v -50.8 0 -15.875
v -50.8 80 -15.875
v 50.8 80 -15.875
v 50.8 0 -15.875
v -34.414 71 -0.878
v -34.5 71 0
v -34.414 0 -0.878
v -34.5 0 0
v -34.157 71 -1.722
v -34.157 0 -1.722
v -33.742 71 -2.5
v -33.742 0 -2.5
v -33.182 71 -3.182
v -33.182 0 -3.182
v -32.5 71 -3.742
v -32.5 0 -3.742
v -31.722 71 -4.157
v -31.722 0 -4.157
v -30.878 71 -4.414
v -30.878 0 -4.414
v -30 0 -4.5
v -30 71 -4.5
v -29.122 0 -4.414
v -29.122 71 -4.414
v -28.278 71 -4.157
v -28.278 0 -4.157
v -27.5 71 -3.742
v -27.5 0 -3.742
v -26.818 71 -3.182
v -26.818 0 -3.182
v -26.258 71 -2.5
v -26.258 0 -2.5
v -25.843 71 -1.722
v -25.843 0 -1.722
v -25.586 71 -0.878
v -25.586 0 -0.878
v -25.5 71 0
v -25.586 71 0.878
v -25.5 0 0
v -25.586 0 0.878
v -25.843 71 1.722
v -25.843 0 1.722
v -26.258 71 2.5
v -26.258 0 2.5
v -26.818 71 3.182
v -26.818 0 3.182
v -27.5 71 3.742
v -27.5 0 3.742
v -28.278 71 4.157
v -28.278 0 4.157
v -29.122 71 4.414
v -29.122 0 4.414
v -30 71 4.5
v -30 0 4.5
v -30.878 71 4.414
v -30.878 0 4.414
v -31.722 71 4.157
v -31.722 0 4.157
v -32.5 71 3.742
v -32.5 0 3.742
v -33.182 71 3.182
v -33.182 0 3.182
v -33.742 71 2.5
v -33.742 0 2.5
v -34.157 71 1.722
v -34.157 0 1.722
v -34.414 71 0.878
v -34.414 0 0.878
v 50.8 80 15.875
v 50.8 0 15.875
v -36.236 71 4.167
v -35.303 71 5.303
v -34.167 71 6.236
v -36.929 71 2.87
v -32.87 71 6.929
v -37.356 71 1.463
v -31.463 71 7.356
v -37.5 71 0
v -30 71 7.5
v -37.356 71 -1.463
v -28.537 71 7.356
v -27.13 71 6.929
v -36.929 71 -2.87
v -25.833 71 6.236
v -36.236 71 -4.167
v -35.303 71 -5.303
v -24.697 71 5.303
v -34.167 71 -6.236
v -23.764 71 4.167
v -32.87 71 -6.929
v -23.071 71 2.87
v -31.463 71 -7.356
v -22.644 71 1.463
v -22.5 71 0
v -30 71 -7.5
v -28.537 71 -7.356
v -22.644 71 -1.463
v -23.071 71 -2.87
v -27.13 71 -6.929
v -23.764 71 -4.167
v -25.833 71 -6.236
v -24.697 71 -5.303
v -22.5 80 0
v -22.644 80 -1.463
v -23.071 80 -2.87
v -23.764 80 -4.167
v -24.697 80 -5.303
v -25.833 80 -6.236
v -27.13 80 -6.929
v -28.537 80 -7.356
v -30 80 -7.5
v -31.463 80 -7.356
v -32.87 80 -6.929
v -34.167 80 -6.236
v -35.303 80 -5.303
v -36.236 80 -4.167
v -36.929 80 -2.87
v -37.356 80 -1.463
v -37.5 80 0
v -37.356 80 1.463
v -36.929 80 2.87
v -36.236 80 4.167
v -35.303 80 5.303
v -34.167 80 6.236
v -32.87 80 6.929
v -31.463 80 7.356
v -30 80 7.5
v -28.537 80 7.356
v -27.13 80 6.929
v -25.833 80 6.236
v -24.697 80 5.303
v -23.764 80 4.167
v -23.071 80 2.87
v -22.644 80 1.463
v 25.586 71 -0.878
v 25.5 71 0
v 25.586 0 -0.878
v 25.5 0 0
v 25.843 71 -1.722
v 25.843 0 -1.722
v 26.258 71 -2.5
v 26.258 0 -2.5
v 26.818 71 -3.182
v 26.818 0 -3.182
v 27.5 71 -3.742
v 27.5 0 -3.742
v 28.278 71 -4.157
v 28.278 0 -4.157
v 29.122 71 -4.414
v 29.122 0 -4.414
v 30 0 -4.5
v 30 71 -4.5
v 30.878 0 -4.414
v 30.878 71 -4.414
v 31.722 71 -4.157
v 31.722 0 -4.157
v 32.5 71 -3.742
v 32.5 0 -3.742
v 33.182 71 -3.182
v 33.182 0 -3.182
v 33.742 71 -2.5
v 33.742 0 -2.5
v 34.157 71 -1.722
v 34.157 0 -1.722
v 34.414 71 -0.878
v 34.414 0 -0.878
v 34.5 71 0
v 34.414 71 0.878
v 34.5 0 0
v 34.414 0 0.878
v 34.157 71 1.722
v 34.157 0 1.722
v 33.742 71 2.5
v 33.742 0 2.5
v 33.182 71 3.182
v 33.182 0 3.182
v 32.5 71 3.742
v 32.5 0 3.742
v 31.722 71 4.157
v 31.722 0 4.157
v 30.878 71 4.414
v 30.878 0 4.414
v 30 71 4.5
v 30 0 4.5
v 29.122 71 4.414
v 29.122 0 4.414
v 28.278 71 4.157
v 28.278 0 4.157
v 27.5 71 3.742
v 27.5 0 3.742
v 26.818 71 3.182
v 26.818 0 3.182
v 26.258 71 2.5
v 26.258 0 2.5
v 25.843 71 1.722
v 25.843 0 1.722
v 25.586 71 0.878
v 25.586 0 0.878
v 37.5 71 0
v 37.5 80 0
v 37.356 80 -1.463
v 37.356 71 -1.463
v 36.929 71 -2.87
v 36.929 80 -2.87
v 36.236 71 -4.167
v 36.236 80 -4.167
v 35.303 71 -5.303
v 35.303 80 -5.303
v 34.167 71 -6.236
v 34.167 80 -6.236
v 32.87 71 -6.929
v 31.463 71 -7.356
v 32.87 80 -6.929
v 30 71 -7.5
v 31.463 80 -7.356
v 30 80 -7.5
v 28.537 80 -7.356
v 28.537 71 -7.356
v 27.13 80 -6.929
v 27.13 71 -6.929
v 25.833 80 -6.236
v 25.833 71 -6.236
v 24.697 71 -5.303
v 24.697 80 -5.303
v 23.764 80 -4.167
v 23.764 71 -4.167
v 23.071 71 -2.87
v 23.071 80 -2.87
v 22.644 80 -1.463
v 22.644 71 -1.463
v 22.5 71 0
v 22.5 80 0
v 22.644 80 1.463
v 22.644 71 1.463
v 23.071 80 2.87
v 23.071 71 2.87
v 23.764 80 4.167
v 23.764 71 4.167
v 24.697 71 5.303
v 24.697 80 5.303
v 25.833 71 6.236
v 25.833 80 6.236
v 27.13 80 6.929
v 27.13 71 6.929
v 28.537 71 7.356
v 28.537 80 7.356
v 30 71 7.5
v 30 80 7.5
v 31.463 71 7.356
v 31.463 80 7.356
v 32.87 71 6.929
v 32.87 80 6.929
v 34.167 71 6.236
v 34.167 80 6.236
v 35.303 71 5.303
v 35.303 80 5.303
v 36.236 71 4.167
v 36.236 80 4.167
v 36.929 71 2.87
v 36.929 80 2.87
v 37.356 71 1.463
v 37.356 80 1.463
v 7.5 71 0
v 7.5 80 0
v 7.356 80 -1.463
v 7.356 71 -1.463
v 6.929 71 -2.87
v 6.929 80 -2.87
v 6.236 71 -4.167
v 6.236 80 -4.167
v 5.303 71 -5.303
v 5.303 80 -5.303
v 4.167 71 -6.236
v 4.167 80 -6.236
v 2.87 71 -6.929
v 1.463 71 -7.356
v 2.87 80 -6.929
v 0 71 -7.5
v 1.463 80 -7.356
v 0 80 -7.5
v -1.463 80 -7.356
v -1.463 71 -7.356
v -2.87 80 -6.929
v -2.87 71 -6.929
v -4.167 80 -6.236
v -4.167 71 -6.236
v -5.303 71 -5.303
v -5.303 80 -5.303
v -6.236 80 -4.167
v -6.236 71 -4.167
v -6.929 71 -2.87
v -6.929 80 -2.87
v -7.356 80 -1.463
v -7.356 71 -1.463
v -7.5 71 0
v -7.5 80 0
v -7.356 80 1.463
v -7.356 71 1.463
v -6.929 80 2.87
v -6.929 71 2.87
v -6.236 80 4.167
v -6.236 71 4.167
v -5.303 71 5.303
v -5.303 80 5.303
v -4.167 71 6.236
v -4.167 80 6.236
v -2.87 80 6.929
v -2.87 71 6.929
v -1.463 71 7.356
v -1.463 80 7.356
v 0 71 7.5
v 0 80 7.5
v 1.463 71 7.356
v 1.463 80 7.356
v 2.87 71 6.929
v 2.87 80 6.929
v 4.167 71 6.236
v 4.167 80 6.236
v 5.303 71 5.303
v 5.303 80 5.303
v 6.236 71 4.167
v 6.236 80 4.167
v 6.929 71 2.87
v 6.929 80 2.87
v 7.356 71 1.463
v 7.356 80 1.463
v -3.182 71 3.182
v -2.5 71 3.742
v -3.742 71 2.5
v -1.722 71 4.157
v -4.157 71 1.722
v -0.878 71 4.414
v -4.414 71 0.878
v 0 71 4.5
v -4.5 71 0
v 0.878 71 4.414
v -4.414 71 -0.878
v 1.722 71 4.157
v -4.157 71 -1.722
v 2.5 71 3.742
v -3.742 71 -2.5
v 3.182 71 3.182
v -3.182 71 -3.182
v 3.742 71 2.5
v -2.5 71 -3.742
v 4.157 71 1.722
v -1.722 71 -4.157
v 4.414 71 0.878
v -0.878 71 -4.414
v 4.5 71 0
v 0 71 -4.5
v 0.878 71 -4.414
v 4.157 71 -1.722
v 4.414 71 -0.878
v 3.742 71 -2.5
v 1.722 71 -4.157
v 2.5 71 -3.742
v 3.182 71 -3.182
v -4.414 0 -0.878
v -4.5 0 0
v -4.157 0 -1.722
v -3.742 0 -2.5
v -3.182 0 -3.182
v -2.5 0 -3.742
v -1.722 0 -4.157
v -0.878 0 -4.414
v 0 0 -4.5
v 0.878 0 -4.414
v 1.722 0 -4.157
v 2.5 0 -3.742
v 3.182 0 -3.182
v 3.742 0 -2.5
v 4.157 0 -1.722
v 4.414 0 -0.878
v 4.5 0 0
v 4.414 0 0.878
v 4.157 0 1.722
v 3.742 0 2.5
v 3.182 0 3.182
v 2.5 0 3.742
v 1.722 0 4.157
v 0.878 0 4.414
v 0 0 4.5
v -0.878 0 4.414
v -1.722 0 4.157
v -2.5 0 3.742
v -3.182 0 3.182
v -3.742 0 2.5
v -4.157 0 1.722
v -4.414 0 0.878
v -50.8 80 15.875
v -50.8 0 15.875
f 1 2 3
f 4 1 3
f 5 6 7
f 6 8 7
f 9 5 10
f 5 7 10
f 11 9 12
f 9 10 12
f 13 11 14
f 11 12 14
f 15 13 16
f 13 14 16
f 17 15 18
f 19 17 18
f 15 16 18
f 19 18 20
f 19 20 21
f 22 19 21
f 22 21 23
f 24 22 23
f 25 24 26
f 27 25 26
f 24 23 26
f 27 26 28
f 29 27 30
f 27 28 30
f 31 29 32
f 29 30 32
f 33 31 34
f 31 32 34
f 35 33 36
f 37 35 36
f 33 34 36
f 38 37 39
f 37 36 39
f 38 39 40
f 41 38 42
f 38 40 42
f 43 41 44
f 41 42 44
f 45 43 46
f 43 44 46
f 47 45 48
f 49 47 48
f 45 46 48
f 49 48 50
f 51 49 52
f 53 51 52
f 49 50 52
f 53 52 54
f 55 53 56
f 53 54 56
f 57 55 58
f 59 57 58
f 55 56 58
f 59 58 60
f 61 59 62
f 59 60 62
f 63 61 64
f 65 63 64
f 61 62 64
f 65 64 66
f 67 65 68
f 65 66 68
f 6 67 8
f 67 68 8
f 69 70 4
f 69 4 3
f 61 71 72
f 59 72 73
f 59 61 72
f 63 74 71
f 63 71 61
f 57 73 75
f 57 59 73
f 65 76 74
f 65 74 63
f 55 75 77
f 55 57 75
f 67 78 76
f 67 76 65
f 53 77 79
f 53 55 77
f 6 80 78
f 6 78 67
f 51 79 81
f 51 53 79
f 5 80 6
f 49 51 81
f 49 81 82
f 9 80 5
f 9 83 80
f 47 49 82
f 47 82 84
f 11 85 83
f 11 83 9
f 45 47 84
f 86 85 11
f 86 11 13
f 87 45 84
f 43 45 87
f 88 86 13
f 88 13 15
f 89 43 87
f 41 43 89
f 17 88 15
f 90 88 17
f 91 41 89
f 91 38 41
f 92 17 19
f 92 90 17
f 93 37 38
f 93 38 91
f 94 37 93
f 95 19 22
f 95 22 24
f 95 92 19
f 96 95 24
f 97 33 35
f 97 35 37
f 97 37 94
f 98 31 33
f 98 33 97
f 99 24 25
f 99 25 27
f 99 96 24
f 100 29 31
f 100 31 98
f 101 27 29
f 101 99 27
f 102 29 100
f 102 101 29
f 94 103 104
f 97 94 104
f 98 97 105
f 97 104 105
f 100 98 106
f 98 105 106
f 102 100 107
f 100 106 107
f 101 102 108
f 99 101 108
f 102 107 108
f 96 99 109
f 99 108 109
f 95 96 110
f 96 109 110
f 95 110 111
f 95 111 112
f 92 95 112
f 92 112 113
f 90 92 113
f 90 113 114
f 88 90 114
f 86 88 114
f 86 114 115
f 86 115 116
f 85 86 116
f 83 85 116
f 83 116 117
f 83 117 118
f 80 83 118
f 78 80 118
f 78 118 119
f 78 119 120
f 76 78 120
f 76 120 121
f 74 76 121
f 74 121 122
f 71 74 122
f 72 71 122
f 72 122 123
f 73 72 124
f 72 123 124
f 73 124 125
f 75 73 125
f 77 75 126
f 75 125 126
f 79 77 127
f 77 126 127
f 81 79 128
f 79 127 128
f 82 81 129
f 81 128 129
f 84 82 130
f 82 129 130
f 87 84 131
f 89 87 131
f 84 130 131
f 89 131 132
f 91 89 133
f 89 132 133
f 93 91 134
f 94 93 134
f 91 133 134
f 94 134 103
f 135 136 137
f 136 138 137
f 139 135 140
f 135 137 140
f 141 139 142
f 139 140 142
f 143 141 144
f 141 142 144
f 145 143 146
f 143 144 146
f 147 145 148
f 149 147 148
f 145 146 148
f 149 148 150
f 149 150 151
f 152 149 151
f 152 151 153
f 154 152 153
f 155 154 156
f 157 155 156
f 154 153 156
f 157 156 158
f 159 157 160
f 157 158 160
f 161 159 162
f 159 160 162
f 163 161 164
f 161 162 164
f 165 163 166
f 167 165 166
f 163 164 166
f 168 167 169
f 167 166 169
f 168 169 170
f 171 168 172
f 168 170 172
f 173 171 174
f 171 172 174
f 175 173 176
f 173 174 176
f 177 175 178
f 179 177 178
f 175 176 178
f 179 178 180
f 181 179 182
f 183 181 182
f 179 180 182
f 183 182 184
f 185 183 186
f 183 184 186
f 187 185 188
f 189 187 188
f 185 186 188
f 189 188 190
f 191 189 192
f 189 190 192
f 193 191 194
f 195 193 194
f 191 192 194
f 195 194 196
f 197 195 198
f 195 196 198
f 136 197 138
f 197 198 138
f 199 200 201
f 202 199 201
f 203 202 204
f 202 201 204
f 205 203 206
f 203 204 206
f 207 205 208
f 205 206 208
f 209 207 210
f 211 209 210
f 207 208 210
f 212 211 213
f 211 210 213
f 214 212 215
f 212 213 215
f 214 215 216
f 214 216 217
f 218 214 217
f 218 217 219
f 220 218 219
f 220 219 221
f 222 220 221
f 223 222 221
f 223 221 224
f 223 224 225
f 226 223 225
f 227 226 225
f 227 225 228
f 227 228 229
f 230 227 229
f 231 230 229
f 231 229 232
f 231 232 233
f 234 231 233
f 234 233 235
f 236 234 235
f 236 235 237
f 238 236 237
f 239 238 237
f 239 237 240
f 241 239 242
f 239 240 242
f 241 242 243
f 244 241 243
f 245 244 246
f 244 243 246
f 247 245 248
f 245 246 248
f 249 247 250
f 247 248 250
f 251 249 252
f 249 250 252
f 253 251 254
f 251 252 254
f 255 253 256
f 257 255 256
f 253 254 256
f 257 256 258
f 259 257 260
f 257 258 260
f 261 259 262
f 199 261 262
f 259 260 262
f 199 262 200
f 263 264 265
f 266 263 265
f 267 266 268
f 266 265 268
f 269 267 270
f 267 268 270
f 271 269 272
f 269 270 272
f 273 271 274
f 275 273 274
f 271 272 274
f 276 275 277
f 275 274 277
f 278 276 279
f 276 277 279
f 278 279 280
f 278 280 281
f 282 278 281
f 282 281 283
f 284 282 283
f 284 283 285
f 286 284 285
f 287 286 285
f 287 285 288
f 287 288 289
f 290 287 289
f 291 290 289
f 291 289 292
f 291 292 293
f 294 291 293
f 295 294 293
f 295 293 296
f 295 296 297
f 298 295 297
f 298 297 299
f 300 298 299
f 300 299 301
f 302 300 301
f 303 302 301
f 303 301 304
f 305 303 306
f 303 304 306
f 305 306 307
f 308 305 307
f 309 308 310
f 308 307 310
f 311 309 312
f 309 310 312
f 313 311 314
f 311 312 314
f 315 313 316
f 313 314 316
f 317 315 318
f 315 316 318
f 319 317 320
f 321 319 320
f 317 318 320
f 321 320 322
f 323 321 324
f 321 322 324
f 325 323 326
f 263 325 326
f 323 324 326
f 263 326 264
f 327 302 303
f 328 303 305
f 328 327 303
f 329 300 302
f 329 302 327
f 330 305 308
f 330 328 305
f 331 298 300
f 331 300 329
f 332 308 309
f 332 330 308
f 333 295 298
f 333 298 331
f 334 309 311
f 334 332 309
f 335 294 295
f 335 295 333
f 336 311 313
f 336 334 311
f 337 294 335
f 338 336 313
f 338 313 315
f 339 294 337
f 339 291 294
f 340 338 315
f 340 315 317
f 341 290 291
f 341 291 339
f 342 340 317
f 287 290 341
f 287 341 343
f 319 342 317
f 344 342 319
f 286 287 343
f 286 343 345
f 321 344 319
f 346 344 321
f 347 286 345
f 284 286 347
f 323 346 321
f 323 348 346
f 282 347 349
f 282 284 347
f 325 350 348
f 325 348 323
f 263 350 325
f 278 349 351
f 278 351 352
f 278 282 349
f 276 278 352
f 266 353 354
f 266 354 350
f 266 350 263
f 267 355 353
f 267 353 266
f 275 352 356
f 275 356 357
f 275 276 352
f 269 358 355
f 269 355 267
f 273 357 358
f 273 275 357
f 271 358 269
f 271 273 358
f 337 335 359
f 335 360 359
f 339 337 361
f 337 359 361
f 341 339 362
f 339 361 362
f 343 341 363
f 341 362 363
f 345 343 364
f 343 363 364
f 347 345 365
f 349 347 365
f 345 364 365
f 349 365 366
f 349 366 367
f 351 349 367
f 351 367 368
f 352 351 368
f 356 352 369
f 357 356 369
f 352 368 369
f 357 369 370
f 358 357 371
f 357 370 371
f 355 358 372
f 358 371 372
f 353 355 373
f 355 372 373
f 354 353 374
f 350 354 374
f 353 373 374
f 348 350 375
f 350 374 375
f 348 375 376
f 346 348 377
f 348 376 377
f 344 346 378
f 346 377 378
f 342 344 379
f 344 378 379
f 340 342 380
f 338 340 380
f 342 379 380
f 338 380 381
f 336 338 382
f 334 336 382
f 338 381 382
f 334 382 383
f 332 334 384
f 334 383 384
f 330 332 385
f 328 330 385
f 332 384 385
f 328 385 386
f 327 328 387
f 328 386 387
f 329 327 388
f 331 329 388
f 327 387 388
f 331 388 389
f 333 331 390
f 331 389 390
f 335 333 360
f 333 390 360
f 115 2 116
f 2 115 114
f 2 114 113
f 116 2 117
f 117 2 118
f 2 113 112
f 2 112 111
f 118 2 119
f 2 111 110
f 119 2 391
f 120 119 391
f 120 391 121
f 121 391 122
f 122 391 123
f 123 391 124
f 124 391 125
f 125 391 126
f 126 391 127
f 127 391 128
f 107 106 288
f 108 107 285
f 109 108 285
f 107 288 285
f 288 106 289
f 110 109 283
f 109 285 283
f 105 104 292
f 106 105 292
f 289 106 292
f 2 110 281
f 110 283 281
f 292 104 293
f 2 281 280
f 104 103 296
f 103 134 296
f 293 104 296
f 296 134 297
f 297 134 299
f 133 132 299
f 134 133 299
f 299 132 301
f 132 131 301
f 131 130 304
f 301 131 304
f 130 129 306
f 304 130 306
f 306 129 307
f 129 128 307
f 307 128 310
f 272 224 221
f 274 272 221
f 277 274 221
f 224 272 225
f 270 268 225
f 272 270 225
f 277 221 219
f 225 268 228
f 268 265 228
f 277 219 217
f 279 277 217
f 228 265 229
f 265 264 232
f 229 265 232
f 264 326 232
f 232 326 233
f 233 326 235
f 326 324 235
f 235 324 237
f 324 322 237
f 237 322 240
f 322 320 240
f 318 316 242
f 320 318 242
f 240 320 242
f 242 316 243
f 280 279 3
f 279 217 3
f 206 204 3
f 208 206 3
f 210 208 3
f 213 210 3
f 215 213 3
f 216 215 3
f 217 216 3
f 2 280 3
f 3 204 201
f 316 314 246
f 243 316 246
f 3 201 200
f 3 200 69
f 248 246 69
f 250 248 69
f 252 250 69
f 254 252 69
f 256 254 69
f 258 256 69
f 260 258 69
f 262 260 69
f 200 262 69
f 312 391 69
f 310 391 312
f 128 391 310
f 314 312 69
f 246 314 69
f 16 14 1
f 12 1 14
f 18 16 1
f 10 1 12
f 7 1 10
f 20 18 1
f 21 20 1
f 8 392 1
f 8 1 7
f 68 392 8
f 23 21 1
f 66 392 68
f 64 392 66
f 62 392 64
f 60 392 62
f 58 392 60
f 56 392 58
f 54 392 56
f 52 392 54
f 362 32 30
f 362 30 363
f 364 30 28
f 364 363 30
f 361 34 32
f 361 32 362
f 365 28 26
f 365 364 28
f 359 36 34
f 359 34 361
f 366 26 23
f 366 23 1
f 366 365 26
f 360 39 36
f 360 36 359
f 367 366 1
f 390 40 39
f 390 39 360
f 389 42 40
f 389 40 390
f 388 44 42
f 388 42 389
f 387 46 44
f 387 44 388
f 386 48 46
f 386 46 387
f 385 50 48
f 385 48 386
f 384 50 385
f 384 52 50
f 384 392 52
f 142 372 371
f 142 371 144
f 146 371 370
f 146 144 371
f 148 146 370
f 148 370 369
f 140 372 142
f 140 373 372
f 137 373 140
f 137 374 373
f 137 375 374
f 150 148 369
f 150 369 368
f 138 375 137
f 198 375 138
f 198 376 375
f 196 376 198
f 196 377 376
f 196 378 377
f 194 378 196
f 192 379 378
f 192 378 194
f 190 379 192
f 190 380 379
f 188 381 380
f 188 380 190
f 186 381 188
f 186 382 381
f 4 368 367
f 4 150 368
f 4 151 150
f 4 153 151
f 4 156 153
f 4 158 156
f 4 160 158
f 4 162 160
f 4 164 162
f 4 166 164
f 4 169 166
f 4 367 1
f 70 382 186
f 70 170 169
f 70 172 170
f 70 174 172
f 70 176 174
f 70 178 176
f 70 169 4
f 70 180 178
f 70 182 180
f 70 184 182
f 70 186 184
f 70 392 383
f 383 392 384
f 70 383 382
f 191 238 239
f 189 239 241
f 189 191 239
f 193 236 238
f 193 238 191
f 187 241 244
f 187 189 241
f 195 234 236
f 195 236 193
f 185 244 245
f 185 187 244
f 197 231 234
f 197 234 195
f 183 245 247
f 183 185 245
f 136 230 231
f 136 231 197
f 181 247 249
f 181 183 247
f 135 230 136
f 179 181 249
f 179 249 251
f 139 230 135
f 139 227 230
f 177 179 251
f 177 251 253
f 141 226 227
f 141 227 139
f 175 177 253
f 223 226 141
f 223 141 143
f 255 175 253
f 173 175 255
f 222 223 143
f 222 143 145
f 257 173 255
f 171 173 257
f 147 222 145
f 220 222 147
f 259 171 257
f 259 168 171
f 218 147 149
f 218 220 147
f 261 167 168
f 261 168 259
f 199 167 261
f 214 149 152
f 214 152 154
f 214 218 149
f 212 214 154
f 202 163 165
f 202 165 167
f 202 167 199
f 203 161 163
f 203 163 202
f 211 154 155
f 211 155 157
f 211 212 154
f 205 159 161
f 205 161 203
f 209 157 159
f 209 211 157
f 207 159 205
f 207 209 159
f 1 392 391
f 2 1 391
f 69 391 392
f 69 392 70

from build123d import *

# Parameters (mm, degrees)
SKETCH1_W                                           = 101.6
SKETCH1_H                                           = 82.55
BOSS_EXTRUDE1_DEPTH                                 = 15.875
SKETCH2_W                                           = 101.6
SKETCH2_H                                           = 2.55
CUT_EXTRUDE1_DEPTH                                  = 100.943496537
CBORE_FOR_M8_HEX_SOCKET_HEAD_CAP_SCREW1_D           = 9
CBORE_FOR_M8_HEX_SOCKET_HEAD_CAP_SCREW1_CBORE_D     = 15
CBORE_FOR_M8_HEX_SOCKET_HEAD_CAP_SCREW1_CBORE_DEPTH = 9


with BuildPart() as part:
    # Sketch1 → Boss-Extrude1 (new, symmetric)
    with BuildSketch(Plane.XY):
        with Locations((0, 38.725)):
            Rectangle(SKETCH1_W, SKETCH1_H)
    extrude(amount=BOSS_EXTRUDE1_DEPTH, both=True)

    # Sketch2 → Cut-Extrude1 (cut, through all)
    with BuildSketch(Plane.XY.offset(15.875)):
        with Locations((0, -1.275)):
            Rectangle(SKETCH2_W, SKETCH2_H)
    extrude(amount=-CUT_EXTRUDE1_DEPTH, mode=Mode.SUBTRACT)

    # CBORE for M8 Hex Socket Head Cap Screw1 (through all)
    with Locations(Plane(origin=(0, 80, 0), x_dir=(1, 0, 0), z_dir=(0, 1, 0))):
        with Locations((30, 0), (0, 0), (-30, 0)):
            CounterBoreHole(CBORE_FOR_M8_HEX_SOCKET_HEAD_CAP_SCREW1_D / 2, CBORE_FOR_M8_HEX_SOCKET_HEAD_CAP_SCREW1_CBORE_D / 2, CBORE_FOR_M8_HEX_SOCKET_HEAD_CAP_SCREW1_CBORE_DEPTH)


solid = part.part
